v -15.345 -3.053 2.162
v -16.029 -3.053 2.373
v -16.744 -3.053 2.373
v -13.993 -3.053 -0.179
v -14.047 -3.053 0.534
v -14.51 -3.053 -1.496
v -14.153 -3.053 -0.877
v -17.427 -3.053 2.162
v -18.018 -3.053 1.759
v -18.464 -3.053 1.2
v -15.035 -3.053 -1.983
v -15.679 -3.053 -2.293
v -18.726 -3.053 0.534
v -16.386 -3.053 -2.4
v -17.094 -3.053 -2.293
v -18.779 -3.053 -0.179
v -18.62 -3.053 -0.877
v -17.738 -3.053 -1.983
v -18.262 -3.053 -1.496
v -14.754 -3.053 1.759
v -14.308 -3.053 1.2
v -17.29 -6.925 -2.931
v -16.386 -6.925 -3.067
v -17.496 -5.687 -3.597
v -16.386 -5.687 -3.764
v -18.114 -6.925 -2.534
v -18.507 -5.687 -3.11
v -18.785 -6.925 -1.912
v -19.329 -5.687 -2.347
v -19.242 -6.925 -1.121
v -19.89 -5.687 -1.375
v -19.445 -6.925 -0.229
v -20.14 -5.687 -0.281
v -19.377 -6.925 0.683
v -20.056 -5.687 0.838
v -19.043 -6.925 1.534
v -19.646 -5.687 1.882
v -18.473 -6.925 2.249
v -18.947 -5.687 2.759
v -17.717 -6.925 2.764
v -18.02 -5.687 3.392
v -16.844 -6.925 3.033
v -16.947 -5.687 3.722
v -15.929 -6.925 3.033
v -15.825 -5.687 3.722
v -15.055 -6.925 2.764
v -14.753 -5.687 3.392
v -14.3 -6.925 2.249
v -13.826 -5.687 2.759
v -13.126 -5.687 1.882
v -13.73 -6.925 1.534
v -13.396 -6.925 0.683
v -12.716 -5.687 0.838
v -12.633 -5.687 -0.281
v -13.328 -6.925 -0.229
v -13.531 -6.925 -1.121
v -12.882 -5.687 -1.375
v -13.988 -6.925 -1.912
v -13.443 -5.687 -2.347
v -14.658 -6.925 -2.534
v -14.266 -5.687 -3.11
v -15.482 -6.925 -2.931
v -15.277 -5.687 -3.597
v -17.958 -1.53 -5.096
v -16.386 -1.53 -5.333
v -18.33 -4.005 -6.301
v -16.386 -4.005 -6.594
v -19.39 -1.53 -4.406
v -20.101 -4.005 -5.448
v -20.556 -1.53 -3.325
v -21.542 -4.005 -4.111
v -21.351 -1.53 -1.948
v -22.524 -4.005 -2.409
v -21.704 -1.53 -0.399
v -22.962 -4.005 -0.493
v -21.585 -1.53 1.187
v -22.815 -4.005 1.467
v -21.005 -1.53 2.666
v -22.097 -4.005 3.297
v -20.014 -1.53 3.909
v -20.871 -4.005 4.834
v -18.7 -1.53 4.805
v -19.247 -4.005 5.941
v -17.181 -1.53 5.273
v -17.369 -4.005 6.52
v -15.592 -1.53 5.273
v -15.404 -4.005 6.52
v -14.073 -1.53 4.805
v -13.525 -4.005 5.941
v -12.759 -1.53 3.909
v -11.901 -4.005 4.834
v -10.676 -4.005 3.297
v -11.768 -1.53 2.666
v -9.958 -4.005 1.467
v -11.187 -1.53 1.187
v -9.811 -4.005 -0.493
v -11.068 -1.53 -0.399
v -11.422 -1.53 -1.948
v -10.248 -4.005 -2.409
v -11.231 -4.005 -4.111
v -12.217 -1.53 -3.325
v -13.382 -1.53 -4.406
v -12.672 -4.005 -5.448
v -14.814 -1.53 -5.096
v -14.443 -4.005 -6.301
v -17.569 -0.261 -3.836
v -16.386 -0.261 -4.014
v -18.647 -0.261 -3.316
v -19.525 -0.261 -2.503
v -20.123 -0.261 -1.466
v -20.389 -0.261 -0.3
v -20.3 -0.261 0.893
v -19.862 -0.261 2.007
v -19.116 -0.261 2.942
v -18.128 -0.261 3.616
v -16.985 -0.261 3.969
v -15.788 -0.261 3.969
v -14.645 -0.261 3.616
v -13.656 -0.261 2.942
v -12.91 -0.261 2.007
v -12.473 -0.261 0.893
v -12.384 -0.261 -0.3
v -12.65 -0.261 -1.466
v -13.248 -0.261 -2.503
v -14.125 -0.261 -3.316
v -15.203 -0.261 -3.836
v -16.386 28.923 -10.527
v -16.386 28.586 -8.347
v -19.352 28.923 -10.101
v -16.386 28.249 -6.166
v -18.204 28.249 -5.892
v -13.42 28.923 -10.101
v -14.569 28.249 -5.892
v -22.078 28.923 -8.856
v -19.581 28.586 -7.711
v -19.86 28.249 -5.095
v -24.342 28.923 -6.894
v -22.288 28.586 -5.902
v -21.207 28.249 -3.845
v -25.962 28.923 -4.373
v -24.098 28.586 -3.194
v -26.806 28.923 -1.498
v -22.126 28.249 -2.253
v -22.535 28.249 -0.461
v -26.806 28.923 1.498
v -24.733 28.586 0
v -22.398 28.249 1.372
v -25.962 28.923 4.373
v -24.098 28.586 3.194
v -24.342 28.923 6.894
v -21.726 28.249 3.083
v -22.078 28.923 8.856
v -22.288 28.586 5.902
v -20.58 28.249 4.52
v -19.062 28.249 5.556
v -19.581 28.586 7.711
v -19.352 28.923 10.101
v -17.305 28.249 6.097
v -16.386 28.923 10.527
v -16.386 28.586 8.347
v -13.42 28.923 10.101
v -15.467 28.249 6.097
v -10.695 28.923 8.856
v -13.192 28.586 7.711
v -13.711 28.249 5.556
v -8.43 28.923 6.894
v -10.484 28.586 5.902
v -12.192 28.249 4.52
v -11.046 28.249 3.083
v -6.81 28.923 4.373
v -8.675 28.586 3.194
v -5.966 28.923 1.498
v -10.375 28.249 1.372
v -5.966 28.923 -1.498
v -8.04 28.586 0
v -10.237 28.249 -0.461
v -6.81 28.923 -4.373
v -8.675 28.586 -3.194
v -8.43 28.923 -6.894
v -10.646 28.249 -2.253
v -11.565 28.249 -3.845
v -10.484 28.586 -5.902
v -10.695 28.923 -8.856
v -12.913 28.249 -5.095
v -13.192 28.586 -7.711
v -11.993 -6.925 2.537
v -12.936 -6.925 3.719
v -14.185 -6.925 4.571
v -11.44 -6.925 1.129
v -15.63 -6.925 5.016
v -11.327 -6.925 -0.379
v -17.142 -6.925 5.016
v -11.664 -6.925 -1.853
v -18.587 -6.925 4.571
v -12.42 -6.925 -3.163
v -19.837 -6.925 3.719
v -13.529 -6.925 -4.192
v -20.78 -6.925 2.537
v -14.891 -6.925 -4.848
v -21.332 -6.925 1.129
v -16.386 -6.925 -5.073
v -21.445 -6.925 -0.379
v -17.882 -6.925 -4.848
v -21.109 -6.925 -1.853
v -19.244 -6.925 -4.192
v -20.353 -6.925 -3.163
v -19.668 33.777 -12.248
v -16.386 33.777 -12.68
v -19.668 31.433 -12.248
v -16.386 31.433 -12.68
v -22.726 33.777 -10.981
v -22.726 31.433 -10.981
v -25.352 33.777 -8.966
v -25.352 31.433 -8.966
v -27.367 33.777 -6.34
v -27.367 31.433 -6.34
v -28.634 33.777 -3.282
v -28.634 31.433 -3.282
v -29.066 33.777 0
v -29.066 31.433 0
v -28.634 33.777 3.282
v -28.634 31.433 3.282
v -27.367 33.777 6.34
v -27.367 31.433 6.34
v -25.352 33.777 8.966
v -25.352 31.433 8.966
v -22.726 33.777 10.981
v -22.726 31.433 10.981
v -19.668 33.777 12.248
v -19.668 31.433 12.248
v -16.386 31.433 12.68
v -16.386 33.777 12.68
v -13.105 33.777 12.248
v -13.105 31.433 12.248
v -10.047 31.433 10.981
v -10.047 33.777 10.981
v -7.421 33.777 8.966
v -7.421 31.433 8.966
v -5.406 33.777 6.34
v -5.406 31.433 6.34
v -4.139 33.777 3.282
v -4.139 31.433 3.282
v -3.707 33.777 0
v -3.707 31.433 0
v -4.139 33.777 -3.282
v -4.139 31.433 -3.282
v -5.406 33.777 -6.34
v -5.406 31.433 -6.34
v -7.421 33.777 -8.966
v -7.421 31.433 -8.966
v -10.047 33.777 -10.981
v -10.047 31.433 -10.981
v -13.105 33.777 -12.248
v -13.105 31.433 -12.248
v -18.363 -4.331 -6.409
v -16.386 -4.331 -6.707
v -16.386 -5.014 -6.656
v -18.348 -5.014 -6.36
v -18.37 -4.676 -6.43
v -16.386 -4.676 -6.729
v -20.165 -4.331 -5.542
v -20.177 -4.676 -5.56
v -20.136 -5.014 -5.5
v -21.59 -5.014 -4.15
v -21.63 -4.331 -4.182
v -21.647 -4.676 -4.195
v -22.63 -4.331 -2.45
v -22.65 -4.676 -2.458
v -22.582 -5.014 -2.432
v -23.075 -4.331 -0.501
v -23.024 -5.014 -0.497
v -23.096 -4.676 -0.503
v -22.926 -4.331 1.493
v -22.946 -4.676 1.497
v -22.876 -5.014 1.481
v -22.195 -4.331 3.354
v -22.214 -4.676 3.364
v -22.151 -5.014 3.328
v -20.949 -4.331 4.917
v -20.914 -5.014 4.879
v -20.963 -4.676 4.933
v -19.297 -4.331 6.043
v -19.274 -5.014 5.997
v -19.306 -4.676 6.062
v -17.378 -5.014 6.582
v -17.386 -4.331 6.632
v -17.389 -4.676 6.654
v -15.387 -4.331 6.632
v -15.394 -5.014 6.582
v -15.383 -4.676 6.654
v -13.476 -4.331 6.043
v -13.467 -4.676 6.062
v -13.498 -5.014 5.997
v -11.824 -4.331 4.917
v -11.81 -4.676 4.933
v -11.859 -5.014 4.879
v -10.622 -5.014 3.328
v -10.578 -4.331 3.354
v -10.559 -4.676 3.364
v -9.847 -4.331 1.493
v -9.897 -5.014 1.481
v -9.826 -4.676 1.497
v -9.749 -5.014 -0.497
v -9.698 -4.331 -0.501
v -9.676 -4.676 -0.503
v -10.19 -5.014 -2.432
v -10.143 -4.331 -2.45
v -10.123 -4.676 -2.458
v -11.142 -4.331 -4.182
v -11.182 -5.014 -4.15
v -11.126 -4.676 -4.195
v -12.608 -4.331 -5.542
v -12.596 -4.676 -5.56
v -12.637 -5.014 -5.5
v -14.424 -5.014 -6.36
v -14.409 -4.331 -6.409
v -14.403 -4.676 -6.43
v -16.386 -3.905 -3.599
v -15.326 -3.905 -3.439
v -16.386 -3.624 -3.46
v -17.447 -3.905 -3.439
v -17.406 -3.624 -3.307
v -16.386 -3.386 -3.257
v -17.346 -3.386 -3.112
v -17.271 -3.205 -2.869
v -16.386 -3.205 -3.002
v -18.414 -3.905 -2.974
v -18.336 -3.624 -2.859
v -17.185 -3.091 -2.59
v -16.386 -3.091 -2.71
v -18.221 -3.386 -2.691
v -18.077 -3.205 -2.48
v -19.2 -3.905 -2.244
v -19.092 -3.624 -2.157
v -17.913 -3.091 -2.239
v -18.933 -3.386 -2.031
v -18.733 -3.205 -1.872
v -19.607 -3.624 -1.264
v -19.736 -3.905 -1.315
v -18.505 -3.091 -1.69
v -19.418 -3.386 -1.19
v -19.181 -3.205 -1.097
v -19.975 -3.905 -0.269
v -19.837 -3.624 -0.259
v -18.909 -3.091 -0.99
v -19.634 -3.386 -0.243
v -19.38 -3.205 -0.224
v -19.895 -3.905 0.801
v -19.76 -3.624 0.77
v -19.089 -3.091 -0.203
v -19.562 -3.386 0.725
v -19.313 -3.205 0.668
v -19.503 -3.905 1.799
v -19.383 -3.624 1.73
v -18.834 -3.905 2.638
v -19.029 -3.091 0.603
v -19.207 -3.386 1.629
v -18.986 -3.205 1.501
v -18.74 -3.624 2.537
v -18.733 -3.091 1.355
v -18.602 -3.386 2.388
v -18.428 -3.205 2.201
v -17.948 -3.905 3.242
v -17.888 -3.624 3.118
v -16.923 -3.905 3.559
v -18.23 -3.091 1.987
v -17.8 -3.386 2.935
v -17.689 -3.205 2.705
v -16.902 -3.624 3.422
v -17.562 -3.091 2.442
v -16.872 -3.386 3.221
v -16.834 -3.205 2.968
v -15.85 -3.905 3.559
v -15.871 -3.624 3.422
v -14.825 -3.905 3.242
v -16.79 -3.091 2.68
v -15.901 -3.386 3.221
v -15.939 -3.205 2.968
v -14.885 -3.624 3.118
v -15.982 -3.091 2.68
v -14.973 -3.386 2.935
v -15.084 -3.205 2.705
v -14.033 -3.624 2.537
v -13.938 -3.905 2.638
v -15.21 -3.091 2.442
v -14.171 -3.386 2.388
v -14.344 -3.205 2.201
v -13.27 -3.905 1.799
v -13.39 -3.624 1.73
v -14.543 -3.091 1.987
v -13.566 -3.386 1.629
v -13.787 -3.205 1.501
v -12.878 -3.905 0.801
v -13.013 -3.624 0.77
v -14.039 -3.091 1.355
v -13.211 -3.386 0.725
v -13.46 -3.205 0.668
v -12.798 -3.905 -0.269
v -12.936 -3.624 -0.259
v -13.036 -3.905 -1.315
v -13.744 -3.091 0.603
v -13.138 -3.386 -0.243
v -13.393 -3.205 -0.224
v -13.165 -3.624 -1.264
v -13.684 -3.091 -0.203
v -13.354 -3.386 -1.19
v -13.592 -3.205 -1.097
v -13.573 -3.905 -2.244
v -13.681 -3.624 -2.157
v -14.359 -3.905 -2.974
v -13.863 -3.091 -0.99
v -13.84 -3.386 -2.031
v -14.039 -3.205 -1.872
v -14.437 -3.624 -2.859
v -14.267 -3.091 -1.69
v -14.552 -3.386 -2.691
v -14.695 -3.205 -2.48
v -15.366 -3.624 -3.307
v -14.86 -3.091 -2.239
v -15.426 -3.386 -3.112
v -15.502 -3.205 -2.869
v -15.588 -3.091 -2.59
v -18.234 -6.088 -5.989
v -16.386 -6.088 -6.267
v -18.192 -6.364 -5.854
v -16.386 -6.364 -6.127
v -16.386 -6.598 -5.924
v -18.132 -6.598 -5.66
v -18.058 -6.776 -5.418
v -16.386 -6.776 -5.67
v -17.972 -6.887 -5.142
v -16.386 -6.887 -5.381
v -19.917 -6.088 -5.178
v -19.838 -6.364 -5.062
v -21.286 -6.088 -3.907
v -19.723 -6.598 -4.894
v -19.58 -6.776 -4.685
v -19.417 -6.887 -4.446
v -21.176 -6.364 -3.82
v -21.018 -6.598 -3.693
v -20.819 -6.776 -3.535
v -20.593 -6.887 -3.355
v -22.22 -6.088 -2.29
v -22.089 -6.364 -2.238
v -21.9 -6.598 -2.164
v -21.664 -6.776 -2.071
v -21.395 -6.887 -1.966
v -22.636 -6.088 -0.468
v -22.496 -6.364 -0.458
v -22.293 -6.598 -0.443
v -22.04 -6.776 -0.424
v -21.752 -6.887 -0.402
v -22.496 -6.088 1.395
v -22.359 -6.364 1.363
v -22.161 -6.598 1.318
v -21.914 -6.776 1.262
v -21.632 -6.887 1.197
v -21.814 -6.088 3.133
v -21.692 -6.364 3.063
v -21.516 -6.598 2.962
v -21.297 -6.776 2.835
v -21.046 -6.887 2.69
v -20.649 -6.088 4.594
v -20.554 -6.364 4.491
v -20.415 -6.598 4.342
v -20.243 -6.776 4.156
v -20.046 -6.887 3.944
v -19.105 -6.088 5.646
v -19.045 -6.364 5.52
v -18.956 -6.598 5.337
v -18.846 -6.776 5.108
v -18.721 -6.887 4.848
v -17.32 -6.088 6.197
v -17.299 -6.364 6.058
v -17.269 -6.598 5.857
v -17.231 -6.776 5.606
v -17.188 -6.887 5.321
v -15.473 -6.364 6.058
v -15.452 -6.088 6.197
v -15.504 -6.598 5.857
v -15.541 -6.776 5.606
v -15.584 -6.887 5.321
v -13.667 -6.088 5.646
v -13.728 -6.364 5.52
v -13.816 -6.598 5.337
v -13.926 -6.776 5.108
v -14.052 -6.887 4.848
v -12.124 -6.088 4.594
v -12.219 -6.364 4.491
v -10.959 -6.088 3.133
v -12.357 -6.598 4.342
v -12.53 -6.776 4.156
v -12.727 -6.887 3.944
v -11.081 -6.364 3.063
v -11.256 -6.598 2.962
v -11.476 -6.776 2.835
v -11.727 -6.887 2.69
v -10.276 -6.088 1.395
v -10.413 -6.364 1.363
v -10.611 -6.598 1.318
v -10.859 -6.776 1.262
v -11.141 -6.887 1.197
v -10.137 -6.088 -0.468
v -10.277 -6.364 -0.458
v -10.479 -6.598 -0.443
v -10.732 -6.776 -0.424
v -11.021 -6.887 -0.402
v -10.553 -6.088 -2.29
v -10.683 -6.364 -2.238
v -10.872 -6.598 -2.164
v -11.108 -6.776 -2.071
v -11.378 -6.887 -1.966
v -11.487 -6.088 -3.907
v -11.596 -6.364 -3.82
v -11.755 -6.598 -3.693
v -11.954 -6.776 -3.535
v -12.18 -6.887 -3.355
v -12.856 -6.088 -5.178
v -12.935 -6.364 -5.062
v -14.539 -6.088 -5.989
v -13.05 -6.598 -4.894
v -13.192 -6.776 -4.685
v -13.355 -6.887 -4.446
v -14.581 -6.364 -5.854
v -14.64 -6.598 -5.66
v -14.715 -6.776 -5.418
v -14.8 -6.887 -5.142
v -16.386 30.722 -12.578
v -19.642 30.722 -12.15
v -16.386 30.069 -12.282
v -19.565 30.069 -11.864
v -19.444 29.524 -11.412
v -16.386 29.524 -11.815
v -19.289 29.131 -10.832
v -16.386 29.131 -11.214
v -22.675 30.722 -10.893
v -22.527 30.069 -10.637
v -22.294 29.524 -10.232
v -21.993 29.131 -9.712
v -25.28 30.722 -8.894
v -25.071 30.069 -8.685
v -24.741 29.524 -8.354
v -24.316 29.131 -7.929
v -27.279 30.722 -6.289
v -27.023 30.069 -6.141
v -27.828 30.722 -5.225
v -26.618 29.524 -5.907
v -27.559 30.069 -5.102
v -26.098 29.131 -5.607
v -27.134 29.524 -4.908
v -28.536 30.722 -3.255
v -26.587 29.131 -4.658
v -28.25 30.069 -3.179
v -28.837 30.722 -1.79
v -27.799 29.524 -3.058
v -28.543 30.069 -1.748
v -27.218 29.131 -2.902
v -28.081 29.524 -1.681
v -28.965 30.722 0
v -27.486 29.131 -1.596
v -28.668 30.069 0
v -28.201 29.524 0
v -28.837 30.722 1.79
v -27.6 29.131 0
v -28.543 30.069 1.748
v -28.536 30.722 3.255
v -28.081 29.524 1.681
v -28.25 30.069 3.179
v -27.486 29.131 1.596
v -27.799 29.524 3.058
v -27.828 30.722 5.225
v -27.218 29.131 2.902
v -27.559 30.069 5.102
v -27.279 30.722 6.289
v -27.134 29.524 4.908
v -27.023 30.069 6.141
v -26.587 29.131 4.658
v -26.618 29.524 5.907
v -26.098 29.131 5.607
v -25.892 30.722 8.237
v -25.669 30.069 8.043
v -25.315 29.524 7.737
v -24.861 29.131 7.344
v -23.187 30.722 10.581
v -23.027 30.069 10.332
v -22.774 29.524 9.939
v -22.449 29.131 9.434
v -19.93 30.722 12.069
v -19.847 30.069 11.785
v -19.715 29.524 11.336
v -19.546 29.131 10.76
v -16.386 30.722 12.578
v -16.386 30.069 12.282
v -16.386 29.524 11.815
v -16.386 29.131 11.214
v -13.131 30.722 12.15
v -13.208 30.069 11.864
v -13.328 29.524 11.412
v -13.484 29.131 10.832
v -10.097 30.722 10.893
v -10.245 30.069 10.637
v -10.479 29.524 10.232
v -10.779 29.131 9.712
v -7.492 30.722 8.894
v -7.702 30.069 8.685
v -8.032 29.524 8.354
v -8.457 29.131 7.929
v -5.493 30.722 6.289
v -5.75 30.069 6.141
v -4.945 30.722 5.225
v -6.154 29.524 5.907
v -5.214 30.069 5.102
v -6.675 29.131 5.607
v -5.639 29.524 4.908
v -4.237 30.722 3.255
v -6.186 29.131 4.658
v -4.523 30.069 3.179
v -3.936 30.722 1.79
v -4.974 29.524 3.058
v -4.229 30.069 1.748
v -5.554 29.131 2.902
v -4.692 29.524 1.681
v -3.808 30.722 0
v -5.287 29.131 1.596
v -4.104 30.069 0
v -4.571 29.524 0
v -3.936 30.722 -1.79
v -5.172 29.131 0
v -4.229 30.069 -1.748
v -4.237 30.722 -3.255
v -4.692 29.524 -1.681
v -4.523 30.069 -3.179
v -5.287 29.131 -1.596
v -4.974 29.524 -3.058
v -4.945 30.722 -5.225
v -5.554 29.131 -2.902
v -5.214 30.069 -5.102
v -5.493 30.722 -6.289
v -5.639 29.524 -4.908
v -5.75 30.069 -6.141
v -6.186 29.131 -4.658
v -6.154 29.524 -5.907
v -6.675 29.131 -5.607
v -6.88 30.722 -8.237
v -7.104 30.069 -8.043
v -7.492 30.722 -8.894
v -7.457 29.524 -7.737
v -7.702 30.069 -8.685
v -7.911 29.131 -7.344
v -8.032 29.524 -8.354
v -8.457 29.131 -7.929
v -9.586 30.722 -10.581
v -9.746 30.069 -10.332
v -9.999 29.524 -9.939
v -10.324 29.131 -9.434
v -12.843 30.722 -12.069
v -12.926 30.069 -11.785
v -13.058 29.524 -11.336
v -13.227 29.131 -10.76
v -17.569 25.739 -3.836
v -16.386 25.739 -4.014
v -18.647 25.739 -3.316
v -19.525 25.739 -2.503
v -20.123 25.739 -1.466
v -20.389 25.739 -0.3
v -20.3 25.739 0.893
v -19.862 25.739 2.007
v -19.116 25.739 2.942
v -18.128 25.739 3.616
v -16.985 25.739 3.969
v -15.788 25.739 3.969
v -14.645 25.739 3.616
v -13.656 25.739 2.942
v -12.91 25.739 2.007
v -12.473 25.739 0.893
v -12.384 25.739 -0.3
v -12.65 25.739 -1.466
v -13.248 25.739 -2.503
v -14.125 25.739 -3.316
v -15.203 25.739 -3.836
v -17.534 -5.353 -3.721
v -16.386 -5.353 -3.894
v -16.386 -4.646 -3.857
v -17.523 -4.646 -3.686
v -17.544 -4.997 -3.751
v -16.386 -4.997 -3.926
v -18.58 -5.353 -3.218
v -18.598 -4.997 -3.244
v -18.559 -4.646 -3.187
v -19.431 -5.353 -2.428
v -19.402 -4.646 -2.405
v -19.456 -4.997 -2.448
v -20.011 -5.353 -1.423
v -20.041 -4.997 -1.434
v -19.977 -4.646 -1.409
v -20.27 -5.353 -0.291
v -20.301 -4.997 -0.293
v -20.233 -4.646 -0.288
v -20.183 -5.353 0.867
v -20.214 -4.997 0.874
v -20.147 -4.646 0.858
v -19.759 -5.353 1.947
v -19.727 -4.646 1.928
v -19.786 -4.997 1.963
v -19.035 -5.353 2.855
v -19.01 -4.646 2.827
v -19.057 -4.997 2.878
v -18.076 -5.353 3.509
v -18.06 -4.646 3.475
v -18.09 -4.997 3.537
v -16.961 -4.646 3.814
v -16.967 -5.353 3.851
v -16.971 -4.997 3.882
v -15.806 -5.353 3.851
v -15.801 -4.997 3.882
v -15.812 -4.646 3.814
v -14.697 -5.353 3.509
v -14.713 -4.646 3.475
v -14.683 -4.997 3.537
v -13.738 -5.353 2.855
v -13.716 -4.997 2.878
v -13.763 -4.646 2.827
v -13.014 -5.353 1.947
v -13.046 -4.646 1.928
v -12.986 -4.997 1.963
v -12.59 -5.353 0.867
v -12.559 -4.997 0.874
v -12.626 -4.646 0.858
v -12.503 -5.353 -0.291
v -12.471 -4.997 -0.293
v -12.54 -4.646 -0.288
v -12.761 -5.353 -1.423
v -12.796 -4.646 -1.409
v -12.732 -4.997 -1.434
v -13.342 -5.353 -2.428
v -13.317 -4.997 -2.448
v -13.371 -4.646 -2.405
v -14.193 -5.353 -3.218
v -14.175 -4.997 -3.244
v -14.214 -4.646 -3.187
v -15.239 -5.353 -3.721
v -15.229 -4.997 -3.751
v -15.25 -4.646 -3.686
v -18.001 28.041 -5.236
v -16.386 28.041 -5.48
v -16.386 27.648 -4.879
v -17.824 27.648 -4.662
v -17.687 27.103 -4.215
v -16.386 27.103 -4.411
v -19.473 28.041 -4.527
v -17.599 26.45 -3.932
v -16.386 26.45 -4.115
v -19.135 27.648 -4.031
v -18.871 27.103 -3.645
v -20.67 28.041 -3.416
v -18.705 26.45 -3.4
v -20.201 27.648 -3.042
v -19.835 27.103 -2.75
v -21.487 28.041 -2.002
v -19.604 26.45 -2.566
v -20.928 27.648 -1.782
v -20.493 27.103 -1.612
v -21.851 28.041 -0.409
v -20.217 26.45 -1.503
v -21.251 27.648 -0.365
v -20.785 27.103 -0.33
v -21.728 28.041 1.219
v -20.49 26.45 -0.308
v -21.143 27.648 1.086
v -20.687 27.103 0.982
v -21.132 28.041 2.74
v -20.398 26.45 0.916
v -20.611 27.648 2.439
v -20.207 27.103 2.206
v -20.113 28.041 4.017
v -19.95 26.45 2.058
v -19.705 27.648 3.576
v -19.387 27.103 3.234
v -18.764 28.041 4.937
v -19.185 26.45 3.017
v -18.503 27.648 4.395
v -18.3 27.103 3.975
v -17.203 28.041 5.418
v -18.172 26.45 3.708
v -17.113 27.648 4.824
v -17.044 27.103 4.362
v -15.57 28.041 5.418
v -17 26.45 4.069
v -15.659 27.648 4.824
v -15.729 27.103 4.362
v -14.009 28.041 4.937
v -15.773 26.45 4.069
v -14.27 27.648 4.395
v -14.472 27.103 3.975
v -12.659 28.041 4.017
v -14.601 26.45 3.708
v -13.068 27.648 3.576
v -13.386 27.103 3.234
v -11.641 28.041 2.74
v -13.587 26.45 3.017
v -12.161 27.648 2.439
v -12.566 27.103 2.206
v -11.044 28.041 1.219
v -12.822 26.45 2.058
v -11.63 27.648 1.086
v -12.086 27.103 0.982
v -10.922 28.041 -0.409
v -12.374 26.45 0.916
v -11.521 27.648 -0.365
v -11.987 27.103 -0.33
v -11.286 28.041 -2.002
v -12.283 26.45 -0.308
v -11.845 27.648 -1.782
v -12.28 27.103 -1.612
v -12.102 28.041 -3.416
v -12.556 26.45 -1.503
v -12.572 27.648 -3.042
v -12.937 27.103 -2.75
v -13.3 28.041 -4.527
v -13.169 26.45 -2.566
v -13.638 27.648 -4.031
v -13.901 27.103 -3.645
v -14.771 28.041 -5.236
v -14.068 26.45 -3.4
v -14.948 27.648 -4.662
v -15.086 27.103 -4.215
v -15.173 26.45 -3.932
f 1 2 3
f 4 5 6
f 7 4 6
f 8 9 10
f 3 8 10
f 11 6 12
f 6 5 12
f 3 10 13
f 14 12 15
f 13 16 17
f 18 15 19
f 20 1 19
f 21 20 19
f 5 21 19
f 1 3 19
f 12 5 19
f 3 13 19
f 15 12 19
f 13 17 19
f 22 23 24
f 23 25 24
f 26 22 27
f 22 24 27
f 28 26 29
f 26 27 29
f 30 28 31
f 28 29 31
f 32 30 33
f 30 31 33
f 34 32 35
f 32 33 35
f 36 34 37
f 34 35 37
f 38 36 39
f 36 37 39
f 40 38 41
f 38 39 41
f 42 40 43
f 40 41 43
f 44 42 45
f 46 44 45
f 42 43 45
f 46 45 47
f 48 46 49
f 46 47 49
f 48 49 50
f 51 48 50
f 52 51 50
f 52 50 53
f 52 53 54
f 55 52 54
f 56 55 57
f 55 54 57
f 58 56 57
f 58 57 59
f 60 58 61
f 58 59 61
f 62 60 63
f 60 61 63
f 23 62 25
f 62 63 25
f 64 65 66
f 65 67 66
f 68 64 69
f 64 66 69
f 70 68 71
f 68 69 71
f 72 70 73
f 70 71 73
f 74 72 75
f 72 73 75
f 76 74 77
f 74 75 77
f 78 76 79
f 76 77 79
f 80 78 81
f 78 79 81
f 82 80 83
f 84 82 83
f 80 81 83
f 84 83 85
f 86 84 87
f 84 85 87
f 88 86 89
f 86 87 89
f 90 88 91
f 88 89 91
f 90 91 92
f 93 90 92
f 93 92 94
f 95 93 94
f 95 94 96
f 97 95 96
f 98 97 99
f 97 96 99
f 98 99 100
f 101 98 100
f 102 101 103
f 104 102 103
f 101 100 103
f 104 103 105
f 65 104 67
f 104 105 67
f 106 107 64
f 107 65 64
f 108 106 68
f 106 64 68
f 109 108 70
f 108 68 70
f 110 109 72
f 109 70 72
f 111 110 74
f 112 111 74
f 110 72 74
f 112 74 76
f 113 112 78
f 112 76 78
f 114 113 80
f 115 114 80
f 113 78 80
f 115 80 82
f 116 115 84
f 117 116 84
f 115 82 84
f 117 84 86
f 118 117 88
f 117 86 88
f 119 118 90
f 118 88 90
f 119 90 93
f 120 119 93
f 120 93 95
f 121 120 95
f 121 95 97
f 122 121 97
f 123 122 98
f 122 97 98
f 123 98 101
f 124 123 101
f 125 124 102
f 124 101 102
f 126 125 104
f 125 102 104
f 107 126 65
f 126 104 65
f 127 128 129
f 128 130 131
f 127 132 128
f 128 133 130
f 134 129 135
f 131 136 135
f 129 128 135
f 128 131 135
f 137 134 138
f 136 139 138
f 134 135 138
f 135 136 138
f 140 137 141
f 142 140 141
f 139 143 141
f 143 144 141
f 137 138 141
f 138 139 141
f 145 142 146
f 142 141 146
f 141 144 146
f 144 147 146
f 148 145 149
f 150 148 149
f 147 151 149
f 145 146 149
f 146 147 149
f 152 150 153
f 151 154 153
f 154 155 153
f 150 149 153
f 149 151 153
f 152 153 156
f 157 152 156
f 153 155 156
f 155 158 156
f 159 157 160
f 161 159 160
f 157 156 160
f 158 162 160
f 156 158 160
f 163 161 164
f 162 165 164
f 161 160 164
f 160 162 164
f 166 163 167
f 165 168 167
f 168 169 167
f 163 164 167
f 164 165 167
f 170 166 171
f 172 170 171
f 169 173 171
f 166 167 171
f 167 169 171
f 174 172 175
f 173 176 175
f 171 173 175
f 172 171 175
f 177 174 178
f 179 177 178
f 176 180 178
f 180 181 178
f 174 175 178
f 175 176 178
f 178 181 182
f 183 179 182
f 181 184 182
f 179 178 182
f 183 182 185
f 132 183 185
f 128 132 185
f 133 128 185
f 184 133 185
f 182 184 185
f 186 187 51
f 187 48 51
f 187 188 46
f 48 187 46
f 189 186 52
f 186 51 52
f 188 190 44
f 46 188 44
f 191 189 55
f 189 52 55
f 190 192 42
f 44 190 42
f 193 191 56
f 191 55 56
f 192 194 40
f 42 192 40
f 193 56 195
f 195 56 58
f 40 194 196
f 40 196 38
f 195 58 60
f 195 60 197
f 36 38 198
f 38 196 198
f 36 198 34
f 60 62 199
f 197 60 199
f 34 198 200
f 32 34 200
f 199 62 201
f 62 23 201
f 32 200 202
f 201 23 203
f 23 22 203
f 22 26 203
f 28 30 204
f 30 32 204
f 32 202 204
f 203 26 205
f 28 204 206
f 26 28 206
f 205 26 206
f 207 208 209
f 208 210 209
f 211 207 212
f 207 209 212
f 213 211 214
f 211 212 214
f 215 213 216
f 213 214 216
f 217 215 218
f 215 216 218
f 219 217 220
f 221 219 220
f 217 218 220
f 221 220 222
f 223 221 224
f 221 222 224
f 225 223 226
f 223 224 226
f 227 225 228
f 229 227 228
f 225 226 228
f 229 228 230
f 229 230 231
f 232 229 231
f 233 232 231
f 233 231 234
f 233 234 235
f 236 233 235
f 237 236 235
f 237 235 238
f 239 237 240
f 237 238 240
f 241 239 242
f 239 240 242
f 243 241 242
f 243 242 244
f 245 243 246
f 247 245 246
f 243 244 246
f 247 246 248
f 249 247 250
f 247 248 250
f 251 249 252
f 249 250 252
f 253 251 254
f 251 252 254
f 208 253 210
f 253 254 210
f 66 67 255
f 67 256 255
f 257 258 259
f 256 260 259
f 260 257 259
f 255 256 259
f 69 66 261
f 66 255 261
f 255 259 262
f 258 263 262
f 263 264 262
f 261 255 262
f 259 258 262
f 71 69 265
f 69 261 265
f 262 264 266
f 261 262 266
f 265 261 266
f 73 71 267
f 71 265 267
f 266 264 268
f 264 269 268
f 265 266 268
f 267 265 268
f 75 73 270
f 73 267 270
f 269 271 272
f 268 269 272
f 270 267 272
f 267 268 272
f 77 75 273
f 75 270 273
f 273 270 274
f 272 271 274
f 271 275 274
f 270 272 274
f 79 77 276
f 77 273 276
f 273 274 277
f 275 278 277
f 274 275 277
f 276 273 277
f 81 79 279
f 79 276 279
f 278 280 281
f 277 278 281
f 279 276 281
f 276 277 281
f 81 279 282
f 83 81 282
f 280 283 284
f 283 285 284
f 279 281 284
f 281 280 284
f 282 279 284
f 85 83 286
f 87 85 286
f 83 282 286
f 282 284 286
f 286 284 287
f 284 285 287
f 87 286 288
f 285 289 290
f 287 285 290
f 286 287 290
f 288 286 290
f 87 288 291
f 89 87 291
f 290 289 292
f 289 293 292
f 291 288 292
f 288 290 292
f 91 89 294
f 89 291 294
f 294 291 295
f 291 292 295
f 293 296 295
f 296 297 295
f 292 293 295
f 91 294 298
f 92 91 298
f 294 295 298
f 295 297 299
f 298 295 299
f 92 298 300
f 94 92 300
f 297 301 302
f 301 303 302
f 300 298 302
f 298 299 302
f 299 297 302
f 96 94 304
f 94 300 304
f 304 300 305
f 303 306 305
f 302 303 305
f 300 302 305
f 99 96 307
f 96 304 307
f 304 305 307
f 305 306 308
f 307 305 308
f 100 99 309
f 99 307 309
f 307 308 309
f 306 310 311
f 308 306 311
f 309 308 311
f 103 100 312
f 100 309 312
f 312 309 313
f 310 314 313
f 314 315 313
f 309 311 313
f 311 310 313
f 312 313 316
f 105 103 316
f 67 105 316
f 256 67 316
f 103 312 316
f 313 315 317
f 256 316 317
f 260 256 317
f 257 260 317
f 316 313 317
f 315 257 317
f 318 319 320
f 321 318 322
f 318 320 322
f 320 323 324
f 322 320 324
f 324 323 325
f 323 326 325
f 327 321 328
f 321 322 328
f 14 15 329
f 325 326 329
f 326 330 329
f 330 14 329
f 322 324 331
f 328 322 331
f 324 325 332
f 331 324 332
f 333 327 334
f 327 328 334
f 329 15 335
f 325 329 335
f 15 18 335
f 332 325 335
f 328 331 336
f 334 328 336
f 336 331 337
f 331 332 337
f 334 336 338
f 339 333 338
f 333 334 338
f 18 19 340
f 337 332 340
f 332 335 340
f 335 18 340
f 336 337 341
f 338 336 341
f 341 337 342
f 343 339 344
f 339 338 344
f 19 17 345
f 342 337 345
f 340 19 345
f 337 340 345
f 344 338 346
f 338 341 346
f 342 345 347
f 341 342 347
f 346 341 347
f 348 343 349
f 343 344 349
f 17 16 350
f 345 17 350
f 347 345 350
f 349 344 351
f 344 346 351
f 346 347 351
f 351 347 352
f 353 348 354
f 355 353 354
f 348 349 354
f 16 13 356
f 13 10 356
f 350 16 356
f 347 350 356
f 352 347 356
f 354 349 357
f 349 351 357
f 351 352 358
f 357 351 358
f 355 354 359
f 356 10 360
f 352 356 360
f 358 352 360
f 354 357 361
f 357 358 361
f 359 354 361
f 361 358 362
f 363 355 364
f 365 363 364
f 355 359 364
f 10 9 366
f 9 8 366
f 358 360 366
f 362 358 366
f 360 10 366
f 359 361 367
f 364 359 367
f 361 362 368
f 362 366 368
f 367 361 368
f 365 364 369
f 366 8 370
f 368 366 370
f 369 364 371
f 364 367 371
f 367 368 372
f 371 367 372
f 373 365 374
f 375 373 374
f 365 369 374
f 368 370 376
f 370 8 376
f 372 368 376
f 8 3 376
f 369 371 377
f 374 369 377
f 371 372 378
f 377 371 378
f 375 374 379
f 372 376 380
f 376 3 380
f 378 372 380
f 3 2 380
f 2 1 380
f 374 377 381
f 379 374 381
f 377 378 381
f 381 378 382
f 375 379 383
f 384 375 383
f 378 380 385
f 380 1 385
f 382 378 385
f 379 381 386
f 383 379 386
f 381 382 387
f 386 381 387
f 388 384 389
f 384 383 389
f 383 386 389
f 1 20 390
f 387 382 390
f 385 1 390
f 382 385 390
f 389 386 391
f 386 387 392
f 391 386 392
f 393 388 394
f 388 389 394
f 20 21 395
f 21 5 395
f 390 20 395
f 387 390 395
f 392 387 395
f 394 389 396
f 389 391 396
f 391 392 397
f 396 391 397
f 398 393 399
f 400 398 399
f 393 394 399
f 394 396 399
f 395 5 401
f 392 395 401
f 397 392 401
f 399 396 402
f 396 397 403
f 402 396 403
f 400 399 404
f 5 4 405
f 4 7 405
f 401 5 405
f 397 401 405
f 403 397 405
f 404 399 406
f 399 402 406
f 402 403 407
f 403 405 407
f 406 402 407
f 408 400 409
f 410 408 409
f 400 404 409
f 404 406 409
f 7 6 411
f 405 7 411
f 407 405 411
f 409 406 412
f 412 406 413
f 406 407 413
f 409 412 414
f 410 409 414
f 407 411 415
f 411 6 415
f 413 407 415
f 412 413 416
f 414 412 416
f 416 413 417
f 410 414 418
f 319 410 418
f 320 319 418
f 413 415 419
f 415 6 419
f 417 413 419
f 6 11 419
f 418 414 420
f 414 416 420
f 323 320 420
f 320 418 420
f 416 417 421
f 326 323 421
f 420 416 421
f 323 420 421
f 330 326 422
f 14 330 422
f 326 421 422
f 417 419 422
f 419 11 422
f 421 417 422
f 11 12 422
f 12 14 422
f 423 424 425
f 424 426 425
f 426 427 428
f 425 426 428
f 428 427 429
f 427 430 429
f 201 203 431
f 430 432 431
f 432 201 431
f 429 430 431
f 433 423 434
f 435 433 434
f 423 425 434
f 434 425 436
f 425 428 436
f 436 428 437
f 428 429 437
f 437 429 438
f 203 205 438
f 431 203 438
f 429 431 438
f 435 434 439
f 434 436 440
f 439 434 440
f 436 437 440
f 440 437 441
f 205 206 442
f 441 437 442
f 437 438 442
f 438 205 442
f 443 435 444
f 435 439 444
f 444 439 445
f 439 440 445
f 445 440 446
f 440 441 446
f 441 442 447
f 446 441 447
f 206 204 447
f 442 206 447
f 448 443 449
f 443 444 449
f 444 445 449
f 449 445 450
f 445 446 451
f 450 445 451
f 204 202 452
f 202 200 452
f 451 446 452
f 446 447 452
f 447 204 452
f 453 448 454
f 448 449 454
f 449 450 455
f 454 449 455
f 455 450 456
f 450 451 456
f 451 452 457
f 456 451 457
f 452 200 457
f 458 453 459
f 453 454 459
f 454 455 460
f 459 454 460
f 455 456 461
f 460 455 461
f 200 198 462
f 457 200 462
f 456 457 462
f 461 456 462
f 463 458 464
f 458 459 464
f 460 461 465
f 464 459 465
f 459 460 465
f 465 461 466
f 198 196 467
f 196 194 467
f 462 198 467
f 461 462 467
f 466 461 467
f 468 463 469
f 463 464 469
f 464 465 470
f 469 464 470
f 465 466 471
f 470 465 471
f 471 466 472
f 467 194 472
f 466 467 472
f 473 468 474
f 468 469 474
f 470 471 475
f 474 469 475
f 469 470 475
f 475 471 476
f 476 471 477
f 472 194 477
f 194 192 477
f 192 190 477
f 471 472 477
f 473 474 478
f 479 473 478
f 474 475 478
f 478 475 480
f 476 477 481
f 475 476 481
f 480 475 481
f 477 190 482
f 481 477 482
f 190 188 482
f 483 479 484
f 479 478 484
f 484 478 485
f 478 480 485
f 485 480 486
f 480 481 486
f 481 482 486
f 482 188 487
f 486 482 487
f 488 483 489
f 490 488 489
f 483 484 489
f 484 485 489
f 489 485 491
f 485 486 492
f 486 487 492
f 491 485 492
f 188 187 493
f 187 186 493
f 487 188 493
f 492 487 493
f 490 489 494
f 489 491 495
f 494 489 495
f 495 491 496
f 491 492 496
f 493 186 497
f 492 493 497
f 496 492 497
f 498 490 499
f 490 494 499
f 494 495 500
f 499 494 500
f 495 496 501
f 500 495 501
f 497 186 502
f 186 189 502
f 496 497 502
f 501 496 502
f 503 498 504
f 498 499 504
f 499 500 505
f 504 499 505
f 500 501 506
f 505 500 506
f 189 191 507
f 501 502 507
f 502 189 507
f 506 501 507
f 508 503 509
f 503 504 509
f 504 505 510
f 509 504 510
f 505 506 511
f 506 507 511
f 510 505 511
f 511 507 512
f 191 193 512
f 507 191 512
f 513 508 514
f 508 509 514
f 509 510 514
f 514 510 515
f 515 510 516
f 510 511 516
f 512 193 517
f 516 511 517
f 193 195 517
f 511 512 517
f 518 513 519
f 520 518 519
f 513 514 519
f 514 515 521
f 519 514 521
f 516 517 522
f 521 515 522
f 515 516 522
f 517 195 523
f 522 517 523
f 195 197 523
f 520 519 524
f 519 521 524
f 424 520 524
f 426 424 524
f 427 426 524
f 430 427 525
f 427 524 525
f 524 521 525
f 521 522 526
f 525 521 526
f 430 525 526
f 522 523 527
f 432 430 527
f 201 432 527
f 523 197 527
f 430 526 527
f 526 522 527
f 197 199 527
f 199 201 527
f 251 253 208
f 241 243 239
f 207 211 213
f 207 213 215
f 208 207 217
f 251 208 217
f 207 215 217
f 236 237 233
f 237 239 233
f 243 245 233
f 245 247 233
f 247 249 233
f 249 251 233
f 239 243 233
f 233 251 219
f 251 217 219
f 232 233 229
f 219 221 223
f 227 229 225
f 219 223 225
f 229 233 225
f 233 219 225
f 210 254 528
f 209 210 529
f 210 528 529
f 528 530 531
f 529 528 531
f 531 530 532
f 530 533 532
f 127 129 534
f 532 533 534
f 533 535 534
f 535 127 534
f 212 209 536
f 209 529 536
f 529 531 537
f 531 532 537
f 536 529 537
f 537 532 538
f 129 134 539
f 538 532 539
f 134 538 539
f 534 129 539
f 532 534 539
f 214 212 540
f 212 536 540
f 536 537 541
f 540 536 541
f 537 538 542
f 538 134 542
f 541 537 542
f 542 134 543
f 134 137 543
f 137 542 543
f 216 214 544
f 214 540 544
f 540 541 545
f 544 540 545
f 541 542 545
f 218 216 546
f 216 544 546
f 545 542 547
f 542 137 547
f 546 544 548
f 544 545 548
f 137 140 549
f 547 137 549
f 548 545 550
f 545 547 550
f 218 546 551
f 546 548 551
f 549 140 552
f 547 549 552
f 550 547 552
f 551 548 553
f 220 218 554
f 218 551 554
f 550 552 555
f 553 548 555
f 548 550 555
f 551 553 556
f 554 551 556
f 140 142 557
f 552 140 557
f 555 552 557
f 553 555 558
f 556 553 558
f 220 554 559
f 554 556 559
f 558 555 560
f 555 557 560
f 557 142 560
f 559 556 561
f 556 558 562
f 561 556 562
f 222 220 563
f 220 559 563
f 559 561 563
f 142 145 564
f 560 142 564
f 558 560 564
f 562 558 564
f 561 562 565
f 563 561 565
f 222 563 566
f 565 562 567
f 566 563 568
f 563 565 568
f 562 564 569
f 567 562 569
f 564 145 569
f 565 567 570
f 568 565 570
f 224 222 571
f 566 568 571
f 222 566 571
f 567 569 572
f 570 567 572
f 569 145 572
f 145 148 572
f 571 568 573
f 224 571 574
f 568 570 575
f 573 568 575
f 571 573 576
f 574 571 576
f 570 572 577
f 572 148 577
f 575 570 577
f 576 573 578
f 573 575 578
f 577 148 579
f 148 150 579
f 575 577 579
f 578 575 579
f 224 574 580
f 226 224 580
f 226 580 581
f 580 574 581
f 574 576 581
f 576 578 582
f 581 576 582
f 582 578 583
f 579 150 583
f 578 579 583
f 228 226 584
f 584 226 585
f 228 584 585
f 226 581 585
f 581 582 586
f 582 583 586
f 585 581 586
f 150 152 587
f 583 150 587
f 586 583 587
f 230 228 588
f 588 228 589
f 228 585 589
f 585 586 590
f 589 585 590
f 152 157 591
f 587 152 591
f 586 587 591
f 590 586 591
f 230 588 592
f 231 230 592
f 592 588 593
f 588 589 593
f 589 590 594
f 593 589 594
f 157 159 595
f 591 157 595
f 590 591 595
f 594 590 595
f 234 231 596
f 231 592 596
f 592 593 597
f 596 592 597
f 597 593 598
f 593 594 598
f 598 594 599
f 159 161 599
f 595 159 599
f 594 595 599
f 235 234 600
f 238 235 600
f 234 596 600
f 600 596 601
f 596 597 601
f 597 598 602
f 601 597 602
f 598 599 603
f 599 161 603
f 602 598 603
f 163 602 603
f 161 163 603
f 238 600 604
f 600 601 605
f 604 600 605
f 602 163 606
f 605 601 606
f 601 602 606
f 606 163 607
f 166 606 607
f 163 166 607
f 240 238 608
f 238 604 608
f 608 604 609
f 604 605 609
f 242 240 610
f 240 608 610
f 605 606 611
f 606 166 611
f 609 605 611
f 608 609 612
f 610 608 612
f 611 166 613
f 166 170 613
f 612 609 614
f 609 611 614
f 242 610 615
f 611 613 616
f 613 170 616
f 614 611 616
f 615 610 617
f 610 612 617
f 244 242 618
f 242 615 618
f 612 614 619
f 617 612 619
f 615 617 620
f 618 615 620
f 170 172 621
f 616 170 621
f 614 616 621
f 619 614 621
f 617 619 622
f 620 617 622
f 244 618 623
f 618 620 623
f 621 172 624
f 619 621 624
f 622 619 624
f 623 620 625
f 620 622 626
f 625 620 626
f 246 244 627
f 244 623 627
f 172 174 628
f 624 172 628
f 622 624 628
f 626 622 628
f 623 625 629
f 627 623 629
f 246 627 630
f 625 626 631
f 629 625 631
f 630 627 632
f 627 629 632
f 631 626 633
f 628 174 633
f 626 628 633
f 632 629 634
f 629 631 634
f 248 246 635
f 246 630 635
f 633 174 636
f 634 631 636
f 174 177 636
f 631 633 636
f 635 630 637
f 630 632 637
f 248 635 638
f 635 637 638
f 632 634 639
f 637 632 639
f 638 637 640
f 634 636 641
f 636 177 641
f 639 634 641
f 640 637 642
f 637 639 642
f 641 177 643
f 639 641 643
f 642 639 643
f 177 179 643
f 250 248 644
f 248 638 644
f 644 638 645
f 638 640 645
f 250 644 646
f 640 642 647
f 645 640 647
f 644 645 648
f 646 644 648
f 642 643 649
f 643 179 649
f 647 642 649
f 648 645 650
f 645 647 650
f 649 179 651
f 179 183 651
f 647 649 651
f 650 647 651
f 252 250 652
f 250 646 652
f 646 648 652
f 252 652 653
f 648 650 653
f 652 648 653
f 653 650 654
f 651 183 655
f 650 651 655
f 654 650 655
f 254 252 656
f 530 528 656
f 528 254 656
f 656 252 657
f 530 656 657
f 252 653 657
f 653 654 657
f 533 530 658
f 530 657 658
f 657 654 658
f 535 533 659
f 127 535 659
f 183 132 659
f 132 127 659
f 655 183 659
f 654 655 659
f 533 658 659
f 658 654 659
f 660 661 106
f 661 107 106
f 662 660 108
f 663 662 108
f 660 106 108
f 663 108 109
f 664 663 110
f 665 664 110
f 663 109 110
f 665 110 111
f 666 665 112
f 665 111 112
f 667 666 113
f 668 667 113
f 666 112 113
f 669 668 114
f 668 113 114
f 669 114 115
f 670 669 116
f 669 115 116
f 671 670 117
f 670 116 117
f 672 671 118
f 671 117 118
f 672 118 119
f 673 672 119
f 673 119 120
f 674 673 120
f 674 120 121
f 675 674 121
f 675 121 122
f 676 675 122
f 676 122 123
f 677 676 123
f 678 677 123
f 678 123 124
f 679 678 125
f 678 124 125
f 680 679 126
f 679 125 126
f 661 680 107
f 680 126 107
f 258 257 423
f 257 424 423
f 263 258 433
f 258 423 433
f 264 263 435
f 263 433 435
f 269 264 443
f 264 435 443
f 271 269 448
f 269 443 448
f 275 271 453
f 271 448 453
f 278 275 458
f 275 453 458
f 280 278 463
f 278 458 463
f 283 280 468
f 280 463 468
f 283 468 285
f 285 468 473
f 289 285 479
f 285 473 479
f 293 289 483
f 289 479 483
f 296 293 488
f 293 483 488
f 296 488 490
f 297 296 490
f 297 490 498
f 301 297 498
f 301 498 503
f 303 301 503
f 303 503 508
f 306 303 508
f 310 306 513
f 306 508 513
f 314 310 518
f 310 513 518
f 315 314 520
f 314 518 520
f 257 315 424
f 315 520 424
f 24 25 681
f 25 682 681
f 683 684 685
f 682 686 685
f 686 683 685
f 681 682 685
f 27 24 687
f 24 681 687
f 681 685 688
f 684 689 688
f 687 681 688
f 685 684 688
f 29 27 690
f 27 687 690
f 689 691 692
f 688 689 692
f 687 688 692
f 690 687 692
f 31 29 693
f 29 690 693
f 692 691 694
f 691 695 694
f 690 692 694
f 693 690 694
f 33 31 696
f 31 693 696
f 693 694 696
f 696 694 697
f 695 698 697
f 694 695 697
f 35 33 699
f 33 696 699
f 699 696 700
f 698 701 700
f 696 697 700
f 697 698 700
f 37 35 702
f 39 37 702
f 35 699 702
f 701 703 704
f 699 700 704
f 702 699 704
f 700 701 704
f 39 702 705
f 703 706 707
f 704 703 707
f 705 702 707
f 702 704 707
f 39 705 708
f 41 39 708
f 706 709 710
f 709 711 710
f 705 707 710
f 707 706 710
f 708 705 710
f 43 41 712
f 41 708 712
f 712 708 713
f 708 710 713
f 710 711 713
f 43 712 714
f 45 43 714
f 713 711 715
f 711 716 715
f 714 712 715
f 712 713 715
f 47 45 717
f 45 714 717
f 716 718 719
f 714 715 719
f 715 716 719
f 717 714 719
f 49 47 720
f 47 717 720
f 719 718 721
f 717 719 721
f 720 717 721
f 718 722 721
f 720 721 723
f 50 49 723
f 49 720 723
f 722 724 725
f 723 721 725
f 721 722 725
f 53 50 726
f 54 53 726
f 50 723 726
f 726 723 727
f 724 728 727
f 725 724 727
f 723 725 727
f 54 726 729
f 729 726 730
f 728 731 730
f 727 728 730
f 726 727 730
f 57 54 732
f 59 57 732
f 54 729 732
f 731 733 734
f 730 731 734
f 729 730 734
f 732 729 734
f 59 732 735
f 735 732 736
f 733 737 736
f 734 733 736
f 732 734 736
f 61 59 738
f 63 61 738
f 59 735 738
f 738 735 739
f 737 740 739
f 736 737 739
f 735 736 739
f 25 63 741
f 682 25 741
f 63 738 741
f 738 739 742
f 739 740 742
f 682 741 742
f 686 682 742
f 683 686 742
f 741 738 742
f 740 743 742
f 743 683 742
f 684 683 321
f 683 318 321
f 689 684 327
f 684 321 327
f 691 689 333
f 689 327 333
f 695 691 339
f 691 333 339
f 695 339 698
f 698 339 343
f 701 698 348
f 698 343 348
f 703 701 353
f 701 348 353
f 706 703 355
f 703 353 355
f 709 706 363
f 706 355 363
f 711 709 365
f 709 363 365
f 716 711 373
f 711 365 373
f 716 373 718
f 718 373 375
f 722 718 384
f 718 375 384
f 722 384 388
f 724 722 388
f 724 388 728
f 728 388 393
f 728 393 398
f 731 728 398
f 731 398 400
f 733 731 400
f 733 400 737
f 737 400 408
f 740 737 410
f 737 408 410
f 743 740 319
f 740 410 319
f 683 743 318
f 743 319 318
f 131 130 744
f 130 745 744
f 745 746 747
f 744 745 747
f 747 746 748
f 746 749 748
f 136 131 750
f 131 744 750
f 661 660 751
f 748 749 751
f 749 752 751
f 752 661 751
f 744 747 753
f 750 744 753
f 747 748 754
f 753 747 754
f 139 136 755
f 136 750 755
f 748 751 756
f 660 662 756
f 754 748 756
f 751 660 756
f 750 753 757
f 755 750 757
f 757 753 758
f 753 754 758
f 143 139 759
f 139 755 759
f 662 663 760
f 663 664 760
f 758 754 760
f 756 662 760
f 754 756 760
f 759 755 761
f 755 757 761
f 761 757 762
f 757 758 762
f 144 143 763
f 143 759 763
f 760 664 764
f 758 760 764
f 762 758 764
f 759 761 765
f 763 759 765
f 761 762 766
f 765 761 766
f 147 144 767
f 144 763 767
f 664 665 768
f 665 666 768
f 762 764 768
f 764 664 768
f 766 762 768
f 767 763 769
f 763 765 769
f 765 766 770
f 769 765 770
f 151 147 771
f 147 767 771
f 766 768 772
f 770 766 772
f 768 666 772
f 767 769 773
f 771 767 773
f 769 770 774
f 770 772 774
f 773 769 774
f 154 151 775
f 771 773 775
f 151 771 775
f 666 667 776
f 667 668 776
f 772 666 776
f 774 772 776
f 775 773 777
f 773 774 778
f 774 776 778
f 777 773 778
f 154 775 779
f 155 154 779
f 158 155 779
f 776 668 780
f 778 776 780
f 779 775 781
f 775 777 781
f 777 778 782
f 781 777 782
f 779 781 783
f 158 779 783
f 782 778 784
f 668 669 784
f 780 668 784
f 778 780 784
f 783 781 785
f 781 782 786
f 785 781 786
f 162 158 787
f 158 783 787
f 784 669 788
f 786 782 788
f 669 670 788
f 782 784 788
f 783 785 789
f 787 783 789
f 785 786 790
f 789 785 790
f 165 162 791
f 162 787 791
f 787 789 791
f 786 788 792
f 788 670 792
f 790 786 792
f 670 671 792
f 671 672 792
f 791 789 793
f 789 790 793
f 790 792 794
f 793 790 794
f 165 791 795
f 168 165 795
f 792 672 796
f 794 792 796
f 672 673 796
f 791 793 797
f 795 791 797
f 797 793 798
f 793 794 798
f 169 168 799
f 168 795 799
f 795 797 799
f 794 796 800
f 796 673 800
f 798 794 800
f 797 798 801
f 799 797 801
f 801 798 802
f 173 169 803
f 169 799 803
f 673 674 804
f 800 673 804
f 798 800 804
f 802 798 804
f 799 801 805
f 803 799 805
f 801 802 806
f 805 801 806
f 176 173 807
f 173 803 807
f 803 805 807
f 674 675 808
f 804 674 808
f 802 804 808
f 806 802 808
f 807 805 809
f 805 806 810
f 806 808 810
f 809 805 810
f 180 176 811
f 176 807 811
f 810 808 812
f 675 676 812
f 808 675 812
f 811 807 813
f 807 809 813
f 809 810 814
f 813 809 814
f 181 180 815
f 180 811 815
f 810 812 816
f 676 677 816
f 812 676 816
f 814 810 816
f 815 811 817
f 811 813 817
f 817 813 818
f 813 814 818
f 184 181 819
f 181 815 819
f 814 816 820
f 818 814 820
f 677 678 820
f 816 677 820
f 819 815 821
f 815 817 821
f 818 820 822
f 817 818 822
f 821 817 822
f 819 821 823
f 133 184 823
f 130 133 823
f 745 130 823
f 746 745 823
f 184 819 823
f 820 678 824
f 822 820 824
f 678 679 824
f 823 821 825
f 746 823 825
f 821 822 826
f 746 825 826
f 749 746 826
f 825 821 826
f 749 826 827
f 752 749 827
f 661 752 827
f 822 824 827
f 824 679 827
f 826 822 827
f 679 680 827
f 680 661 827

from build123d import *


with BuildPart() as part:
    # Sketch1 → Revolve3 (revolve)
    with BuildSketch(Plane.XY, mode=Mode.PRIVATE) as revolve3_sk:
        with BuildLine():
            Line((-20.400236636, 14.424908344), (-20.400236636, -0.261393937))
            Line((-20.400236636, -0.261393937), (-21.719162522, -1.530451169))
            Line((-21.719162522, -1.530451169), (-22.980158849, -4.004592346))
            ThreePointArc((-22.980158849, -4.004592346), (-23.116228268, -4.502948705), (-23.042560909, -5.014267655))
            Line((-23.042560909, -5.014267655), (-22.653341709, -6.087520982))
            ThreePointArc((-22.653341709, -6.087520982), (-22.188474627, -6.694443039), (-21.459427679, -6.924543742))
            Line((-21.459427679, -6.924543742), (-19.4537368, -6.924543742))
            Line((-19.4537368, -6.924543742), (-20.15067284, -5.68654307))
            ThreePointArc((-20.15067284, -5.68654307), (-20.308987647, -5.1760969), (-20.243290857, -4.645717034))
            Line((-20.243290857, -4.645717034), (-19.985241777, -3.90500514))
            ThreePointArc((-19.985241777, -3.90500514), (-19.52155814, -3.287559507), (-18.785937053, -3.05281871))
            Line((-18.785937053, -3.05281871), (-16.386357218, -3.05281871))
            Line((-16.386357218, -3.05281871), (-16.386357218, 33.77718129))
            Line((-16.386357218, 33.77718129), (-29.06595701, 33.77718129))
            Line((-29.06595701, 33.77718129), (-29.06595701, 31.432997969))
            ThreePointArc((-29.06595701, 31.432997969), (-28.454196627, 29.779670421), (-26.91360112, 28.922752554))
            Line((-26.91360112, 28.922752554), (-22.552592527, 28.249304737))
            ThreePointArc((-22.552592527, 28.249304737), (-21.01199702, 27.39238687), (-20.400236636, 25.739059322))
            Line((-20.400236636, 25.739059322), (-20.400236636, 14.424908344))
        make_face()
    revolve(revolve3_sk.sketch.rotate(Axis((-16.386357218, -3.05281871, 0), (0, 1, 0)), 270), axis=Axis((-16.386357218, -3.05281871, 0), (0, 1, 0)))


solid = part.part
